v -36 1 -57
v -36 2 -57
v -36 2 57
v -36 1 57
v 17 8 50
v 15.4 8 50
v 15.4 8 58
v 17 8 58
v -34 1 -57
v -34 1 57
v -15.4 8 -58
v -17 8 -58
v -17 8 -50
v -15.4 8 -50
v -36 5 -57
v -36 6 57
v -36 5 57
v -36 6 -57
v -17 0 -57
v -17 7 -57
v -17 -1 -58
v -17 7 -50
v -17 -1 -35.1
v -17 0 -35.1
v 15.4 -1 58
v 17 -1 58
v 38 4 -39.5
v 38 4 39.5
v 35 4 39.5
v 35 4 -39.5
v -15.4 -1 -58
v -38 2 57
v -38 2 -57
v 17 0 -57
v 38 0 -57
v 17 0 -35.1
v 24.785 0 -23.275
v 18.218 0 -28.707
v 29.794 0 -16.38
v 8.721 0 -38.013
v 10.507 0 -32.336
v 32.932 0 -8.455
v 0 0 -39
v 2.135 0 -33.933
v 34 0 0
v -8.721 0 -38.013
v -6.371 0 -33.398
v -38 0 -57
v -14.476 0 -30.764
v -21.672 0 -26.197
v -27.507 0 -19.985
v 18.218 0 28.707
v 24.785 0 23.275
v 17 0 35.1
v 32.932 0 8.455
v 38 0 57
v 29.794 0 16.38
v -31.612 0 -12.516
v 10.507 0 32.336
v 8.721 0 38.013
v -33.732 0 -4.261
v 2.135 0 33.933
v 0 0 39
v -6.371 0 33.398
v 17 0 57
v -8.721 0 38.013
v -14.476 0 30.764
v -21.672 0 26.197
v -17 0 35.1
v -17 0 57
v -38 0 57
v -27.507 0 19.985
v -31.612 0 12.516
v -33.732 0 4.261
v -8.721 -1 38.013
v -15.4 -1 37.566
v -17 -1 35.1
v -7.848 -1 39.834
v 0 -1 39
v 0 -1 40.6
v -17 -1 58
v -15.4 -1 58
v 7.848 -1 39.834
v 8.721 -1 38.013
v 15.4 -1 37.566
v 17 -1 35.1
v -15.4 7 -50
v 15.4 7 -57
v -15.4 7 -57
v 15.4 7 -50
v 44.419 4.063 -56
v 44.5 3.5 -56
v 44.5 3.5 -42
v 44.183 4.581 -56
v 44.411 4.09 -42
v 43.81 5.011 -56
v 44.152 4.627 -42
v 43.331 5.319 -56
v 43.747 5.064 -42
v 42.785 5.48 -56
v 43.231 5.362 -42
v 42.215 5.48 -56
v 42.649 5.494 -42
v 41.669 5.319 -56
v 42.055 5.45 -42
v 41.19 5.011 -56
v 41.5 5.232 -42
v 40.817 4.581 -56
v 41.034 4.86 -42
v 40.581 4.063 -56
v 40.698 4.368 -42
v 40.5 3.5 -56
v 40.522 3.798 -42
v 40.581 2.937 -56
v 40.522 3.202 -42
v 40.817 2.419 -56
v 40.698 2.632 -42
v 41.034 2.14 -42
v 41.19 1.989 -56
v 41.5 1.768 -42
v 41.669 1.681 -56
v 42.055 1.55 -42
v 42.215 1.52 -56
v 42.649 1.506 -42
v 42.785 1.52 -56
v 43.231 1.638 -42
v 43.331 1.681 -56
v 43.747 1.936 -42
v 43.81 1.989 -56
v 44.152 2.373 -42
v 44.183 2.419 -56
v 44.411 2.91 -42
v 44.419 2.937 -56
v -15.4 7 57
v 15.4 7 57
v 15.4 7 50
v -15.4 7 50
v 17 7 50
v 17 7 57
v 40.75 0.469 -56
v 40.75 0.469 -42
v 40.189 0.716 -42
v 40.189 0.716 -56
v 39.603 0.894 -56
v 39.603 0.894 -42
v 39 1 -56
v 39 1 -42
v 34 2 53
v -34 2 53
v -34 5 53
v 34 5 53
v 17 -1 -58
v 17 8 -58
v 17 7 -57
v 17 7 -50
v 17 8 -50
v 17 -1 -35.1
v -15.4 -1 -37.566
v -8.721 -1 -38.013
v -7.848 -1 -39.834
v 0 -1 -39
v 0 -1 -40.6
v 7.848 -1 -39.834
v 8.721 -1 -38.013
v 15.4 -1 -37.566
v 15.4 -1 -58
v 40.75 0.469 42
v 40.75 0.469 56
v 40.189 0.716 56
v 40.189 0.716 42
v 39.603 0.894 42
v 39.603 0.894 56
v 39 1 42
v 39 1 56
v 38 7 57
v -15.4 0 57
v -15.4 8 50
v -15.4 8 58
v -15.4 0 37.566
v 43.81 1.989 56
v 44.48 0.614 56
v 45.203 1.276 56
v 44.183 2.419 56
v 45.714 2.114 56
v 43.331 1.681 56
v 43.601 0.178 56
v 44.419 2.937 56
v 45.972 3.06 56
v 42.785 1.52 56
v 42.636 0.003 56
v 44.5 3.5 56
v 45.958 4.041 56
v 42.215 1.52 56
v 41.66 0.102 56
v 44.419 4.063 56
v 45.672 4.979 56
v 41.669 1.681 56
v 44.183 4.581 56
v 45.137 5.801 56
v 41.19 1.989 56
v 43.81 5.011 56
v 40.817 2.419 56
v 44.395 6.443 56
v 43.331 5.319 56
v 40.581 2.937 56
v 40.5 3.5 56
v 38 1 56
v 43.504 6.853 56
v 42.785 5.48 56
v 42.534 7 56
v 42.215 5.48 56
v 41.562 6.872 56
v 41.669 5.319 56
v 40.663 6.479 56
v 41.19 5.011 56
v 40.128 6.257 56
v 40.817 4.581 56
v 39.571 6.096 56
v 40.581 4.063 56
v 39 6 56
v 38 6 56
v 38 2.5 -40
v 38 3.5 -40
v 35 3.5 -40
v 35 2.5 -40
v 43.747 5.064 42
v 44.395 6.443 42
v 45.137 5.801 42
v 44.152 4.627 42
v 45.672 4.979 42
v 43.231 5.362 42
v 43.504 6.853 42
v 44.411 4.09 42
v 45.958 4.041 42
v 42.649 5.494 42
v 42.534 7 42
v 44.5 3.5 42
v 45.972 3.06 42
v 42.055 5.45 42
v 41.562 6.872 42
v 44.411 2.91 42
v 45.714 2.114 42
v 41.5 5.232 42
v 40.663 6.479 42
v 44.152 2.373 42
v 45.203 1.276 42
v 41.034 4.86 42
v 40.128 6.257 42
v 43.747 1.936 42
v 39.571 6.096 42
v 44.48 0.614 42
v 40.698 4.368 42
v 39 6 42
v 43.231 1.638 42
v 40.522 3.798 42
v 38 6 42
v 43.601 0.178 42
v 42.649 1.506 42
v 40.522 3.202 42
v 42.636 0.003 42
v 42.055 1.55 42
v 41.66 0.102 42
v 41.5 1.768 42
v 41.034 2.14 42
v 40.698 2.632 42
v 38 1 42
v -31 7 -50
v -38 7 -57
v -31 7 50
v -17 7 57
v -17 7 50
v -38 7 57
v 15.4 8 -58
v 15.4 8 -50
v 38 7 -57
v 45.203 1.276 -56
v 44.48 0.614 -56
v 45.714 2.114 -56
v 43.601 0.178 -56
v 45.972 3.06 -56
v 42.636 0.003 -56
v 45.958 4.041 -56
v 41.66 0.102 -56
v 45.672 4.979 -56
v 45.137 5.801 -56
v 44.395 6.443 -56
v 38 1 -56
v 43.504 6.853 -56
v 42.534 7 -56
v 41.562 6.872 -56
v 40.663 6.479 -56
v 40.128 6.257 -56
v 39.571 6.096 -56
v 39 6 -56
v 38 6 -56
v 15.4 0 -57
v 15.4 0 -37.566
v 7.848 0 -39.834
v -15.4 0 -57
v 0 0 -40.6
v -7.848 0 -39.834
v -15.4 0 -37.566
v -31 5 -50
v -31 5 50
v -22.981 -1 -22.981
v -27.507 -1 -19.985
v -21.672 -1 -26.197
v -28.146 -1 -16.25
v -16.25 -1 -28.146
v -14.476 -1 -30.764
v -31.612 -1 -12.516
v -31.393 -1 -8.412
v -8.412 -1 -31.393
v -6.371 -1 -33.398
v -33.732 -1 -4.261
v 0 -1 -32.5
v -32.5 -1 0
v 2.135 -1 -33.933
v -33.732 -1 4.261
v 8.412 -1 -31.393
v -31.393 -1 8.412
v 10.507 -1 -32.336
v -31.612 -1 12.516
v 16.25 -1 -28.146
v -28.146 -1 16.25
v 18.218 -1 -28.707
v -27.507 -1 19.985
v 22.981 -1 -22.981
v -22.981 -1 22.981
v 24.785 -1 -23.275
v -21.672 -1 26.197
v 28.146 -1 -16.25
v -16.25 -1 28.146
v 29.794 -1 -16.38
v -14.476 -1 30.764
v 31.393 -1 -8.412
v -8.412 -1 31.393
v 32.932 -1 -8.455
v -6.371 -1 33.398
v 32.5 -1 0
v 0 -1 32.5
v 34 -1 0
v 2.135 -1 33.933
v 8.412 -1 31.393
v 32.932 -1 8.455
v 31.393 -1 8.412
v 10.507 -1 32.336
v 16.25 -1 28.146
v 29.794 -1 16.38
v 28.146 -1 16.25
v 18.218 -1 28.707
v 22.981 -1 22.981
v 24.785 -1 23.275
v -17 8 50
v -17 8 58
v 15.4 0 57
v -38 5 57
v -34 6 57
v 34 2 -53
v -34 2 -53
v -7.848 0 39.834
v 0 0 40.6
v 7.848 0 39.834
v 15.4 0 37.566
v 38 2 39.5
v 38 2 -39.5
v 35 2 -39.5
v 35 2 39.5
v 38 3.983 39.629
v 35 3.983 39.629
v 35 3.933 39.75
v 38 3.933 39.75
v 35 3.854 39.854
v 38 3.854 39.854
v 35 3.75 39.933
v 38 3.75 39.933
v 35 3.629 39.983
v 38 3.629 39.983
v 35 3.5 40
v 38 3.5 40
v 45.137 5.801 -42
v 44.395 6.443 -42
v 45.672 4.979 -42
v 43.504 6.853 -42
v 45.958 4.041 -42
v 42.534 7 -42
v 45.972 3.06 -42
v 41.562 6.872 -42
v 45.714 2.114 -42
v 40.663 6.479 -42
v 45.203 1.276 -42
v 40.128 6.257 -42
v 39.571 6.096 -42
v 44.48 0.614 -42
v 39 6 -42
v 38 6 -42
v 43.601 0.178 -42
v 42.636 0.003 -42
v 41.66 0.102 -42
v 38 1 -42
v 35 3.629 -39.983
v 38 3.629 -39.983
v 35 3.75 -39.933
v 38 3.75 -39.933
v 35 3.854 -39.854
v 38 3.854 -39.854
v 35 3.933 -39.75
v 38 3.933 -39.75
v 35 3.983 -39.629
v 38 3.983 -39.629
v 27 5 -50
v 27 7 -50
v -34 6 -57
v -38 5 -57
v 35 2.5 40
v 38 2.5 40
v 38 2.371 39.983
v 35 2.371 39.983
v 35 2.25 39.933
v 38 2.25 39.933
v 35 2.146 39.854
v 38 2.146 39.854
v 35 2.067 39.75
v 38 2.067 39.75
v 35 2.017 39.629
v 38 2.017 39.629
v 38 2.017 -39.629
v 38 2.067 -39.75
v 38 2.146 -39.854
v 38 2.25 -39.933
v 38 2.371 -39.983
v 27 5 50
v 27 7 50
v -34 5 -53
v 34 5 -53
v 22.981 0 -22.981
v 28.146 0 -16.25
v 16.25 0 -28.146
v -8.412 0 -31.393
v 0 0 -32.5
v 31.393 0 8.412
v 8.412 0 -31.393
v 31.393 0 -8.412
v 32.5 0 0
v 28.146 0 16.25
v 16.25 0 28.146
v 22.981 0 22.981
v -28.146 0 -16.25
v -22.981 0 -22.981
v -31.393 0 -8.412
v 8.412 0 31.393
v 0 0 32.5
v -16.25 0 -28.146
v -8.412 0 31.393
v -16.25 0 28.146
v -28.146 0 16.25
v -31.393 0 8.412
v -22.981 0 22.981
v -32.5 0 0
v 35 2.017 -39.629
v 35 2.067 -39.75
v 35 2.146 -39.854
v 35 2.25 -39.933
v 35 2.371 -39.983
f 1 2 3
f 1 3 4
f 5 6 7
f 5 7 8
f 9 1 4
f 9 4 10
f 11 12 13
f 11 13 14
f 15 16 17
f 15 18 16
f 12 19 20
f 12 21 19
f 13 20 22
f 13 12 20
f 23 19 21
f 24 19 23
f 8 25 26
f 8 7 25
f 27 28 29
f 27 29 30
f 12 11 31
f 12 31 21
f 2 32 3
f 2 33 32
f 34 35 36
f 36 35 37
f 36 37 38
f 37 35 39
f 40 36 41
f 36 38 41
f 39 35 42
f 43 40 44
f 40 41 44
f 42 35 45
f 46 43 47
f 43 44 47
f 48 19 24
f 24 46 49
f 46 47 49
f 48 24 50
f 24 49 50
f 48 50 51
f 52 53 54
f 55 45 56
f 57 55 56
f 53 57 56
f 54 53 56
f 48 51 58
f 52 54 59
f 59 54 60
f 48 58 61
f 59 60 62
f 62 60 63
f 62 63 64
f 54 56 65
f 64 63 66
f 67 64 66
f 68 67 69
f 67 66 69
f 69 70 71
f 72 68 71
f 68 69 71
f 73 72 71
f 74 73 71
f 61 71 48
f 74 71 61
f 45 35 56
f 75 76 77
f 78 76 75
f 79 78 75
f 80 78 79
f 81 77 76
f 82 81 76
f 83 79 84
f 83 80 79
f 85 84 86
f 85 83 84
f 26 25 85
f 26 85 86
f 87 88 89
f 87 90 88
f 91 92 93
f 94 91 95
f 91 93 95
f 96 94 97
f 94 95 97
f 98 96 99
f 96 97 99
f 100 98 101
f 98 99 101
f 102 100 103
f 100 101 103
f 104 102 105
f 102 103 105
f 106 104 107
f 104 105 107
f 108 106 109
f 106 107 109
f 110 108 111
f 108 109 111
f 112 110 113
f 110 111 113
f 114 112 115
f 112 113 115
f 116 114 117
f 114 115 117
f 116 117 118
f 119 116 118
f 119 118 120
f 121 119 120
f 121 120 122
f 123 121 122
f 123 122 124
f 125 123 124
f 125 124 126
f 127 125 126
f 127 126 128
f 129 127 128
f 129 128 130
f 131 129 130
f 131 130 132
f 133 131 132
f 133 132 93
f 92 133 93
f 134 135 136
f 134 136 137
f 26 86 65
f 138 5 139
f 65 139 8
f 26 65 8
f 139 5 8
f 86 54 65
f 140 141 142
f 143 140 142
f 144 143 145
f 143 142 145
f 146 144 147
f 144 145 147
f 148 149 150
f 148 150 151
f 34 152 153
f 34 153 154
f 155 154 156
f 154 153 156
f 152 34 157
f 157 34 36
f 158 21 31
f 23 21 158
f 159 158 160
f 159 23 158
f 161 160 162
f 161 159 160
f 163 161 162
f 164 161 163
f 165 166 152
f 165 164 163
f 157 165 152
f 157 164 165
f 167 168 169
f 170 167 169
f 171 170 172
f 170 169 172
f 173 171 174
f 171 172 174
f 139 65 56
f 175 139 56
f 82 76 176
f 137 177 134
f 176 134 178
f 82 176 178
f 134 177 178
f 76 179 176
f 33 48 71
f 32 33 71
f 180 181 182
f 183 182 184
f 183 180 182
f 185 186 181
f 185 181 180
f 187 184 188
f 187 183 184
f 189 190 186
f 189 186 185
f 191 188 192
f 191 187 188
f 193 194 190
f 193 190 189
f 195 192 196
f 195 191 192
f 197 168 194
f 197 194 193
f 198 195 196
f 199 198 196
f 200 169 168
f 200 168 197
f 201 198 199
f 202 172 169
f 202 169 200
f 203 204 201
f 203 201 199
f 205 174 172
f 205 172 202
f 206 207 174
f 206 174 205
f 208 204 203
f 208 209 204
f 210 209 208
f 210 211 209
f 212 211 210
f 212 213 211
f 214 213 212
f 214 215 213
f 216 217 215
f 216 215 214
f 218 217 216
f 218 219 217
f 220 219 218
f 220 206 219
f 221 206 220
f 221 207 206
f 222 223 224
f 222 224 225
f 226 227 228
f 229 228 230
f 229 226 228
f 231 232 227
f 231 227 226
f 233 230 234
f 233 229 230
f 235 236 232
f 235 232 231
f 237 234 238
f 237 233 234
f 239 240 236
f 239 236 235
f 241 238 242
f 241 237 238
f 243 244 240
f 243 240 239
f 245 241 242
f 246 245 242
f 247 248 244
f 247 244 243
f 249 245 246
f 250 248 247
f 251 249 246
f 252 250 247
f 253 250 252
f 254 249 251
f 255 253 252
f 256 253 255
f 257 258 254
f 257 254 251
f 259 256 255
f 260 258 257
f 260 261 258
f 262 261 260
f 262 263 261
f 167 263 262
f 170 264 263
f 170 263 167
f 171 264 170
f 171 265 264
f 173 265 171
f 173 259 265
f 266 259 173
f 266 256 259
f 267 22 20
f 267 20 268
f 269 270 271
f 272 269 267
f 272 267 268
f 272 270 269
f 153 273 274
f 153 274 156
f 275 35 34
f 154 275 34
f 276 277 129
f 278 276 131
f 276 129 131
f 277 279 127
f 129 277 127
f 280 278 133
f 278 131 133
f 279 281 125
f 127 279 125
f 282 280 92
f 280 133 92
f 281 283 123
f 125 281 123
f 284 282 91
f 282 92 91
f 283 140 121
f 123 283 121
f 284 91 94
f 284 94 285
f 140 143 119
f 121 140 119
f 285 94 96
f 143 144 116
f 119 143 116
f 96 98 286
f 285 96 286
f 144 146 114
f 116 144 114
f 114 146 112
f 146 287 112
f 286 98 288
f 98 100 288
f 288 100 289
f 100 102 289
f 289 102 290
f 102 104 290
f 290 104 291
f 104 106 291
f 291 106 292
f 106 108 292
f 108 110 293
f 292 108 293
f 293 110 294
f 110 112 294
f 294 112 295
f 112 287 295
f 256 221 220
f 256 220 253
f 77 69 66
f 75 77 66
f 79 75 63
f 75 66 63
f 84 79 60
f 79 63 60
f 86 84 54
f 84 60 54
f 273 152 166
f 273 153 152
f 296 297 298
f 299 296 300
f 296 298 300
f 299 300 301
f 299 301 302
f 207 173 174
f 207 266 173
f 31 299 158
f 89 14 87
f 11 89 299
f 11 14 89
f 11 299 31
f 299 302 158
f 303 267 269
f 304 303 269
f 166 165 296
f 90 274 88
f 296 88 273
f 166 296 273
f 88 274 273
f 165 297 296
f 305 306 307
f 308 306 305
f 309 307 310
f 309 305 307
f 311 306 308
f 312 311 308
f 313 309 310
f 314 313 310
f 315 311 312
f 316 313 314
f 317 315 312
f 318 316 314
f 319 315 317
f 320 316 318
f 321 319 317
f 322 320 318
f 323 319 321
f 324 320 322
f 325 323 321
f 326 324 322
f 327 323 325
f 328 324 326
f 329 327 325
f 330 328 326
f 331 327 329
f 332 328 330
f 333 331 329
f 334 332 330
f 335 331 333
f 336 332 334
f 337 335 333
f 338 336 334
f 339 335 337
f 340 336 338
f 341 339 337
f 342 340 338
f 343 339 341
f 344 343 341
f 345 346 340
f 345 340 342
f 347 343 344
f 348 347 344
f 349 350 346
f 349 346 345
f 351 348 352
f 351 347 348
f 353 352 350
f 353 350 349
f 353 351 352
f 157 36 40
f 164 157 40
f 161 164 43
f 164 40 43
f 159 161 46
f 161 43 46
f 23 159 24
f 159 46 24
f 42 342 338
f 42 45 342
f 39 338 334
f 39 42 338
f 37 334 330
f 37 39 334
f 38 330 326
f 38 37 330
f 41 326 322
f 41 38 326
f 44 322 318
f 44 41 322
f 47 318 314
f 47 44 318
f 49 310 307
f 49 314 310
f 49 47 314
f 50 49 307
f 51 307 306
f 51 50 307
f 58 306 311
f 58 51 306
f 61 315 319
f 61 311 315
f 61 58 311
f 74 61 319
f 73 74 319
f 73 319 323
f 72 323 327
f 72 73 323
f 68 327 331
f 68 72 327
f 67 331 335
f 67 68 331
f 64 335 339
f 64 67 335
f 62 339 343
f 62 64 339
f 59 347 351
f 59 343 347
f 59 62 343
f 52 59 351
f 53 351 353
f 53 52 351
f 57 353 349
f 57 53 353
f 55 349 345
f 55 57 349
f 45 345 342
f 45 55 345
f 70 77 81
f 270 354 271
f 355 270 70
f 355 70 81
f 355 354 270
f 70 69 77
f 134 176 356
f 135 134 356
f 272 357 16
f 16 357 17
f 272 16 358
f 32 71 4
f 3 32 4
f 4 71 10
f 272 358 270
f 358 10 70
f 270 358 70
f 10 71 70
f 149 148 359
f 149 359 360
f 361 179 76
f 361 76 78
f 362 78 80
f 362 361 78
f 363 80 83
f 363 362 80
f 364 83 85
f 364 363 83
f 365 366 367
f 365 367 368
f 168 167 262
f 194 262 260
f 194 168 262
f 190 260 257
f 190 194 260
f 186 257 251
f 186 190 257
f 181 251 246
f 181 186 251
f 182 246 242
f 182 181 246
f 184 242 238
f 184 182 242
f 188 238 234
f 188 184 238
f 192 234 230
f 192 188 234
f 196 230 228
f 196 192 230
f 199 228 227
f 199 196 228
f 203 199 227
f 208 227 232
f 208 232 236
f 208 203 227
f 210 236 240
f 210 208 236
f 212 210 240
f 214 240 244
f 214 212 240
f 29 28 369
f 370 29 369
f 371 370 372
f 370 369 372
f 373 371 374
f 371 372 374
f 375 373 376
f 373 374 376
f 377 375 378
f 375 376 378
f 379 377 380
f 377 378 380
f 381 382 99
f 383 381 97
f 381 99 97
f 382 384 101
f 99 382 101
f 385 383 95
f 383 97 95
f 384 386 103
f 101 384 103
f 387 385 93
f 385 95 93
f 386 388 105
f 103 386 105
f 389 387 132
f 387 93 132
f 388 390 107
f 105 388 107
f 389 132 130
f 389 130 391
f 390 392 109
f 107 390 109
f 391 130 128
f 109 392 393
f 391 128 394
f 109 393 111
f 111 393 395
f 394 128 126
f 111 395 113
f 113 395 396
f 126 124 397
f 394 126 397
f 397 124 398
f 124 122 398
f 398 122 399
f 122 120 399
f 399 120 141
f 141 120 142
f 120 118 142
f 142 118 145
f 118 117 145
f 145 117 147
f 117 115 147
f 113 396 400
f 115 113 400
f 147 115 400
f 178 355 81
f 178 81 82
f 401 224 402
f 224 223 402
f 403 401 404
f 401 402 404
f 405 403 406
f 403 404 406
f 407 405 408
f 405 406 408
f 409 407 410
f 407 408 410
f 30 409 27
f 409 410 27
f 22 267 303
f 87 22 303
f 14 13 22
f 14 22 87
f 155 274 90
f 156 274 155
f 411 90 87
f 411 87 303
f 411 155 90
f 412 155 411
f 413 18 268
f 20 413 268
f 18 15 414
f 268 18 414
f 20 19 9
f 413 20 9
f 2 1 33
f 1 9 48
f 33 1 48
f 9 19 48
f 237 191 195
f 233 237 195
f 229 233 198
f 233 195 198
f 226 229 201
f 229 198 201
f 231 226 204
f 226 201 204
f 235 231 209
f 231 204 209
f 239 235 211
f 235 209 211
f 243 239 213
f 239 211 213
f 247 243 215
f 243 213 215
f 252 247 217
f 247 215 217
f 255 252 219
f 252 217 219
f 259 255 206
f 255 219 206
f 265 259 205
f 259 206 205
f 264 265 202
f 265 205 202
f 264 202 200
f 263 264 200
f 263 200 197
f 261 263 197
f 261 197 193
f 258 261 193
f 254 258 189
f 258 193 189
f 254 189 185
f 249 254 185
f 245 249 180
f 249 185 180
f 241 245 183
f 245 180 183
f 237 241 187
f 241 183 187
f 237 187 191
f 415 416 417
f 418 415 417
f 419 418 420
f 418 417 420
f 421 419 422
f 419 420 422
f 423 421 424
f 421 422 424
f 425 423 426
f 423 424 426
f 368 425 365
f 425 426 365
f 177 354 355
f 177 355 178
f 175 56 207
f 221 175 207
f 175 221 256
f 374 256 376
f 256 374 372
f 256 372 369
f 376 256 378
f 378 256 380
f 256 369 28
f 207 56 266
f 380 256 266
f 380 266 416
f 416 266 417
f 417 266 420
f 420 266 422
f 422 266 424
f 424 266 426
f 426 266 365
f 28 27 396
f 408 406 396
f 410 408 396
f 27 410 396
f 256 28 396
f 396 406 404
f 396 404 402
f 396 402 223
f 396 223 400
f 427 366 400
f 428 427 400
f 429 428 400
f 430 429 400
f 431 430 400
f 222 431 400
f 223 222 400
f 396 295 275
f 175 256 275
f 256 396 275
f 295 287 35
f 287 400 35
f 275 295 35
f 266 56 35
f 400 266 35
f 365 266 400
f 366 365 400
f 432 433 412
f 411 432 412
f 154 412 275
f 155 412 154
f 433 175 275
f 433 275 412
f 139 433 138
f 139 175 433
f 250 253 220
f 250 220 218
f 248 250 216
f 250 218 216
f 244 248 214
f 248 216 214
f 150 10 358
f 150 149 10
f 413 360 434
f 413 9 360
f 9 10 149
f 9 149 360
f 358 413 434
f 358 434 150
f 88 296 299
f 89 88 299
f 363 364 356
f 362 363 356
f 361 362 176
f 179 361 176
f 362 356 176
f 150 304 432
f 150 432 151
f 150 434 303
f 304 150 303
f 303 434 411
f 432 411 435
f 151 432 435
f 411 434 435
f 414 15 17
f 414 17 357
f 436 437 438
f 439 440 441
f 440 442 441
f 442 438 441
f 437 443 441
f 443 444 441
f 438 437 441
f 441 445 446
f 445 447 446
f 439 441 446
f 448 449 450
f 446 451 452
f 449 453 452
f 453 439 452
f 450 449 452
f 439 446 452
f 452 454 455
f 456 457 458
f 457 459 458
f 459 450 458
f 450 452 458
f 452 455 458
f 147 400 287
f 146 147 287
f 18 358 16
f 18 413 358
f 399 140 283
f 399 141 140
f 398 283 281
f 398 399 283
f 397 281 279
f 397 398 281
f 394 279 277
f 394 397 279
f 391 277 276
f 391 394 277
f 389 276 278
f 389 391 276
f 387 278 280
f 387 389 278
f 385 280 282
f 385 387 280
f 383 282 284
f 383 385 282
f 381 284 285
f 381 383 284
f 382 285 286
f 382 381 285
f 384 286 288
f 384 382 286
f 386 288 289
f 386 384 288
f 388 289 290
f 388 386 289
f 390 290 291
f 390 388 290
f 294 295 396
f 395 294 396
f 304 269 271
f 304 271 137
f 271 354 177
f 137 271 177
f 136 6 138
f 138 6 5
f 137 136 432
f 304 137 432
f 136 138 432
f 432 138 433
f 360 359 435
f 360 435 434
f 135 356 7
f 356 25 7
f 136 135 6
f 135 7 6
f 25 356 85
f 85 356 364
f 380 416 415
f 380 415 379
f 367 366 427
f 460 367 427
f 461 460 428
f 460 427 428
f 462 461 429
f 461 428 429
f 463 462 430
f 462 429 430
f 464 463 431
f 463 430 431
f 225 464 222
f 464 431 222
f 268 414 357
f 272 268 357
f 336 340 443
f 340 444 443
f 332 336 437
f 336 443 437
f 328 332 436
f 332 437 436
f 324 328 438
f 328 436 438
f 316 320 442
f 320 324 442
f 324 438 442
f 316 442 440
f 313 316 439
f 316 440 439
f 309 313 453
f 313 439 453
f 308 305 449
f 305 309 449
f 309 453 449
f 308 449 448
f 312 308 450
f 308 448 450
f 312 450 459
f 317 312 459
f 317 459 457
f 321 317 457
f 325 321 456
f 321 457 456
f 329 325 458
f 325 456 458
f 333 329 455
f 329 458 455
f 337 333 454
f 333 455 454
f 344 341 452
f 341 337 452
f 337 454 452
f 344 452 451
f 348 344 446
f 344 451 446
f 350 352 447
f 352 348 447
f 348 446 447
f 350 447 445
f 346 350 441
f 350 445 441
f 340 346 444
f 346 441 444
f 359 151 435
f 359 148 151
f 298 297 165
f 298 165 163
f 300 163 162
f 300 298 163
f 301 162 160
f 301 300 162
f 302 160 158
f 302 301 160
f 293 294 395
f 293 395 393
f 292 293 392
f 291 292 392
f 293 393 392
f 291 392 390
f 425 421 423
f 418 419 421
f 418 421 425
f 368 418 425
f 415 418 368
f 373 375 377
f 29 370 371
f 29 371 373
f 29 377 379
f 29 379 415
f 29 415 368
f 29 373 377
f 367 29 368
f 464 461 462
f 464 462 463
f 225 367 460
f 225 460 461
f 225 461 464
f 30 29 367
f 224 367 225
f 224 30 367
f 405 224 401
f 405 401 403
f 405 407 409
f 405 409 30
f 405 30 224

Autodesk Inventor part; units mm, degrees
ref_plane "YZ Plane" through (0, 0, 0) normal (1, 0, 0) x (0, 1, 0)
ref_plane "XZ Plane" through (0, 0, 0) normal (0, 1, 0) x (-1, 0, 0)
ref_plane "XY Plane" through (0, 0, 0) normal (0, 0, 1) x (1, 0, 0)
sketch "Эскиз1" plane through (0, 0, 0) normal (0, 1, 0) x (-1, 0, 0)
  line L0 (34, 53) -> (-34, 53)
  line L1 (-34, 53) -> (-34, -53)
  line L2 (-34, -53) -> (34, -53)
  line L3 (34, -53) -> (34, 53)
  line L4 (34, 53) -> (-34, -53) construction
  line L5 (-34, 53) -> (34, -53) construction
  line L6 (38, 57) -> (-38, 57)
  line L7 (-38, 57) -> (-38, -57)
  line L8 (-38, -57) -> (38, -57)
  line L9 (38, -57) -> (38, 57)
  point P0 (0, 0)
  dimension "d1" = 68
  dimension "d2" = 106
  dimension "d3" = 4
extrude "Выдавливание1" add sketch "Эскиз1" along normal blind 2 contours L3 L2 L1 L0
extrude "Выдавливание2" add sketch "Эскиз1" along normal blind 7
sketch "Эскиз2" plane through (0, 7, 0) normal (0, 1, 0) x (1, 0, 0)
  line L0 (34, -53) -> (-34, -53) projected
  line L1 (34, 53) -> (-34, 53)
  line L2 (-34, 53) -> (-34, -53)
  line L3 (-34, -53) -> (34, -53)
  line L4 (34, -53) -> (34, 53)
  line L5 (34, 53) -> (-34, -53) construction
  line L6 (-34, 53) -> (34, -53) construction
  line L7 (-34, -53) -> (-34, -50)
  line L8 (-34, -50) -> (34, -50)
  line L9 (-34, 53) -> (34, 53) projected
  line L10 (-34, 53) -> (-34, 50)
  line L11 (-34, 50) -> (34, 50)
  line L12 (34, 53) -> (34, -53) projected
  line L13 (34, -50) -> (27, -50)
  line L14 (27, -50) -> (27, 50)
  line L15 (-34, 50) -> (-31, 50)
  line L16 (-31, 50) -> (-31, -50)
  point P0 (0, 0)
  dimension "d8" = 3
  dimension "d9" = 3
  dimension "d10" = 7
  dimension "d11" = 3
extrude "Выдавливание3" add sketch "Эскиз2" against normal blind 2 contours L0 L2 L8 L4 | L8 L14 L11 L4 | L2 L11 L16 L8 | L11 L2 L1 L4
sketch "Эскиз3" plane through (38, 0, 57) normal (1, 0, 0) x (0, 0, -1)
  line L0 (114, 0) -> (0, 0) projected
  line L1 (0, 0) -> (16, 0)
  line L2 (16, 0) -> (16, 7)
  line L3 (114, 7) -> (0, 7) projected
  line L4 (114, 0) -> (114, 7) projected
  line L5 (114, 0) -> (98, 0)
  line L6 (98, 0) -> (98, 7)
  line L7 (98, 7) -> (114, 7)
  line L8 (114, 7) -> (114, 0)
  line L9 (0, 0) -> (0, 7)
  line L10 (0, 7) -> (16, 7)
  line L11 (15, 6) -> (15, 1)
  line L12 (15, 1) -> (1, 1)
  line L13 (1, 1) -> (1, 6)
  line L14 (1, 6) -> (15, 6)
  line L15 (99, 6) -> (99, 1)
  line L16 (99, 1) -> (113, 1)
  line L17 (113, 1) -> (113, 6)
  line L18 (113, 6) -> (99, 6)
  line L19 (16, 0) -> (17, 0)
  line L20 (17, 0) -> (17, 2)
  line L21 (98, 0) -> (97, 0)
  line L22 (97, 0) -> (97, 2)
  line L23 (96.5, 2) -> (17.5, 2)
  line L24 (17, 2.5) -> (17, 3.5)
  line L25 (17.5, 4) -> (96.5, 4)
  line L26 (97, 3.5) -> (97, 2.5)
  line L27 (110, 2) -> (4, 2) projected
  arc A0 (17.5, 4) -> (17, 3.5) centre (17.5, 3.5) ccw
  arc A1 (17, 2.5) -> (17.5, 2) centre (17.5, 2.5) ccw
  arc A2 (97, 3.5) -> (96.5, 4) centre (96.5, 3.5) ccw
  arc A3 (96.5, 2) -> (97, 2.5) centre (96.5, 2.5) ccw
  point P0 (57, 0)
  point P1 (17, 4)
  dimension "d14" = 16
  dimension "d15" = 16
  dimension "d16" = 1
  dimension "d17" = 1
  dimension "d18" = 1
  dimension "d19" = 2
  dimension "d20" = 1
  dimension "d21" = 2
  dimension "d22" = 2
  dimension "d23" = 0.5
extrude "Выдавливание4" cut sketch "Эскиз3" against normal blind 3 contours L23 A1 L24 A0 L25 A2 L26 A3
extrude "Выдавливание5" add sketch "Эскиз3" along normal blind 1 contours L15 L18 L17 L16 | L11 L12 L13 L14
sketch "Эскиз4" plane through (38, 0, -57) normal (0, 0, -1) x (-1, 0, 0)
  line L0 (0, 0) -> (76, 0) projected
  line L1 (76, 0) -> (76, 2)
  line L2 (76, 0) -> (76, 7) projected
  line L3 (72, 2) -> (72, 5) projected
  line L4 (76, 2) -> (72, 2)
  line L5 (72, 2) -> (72, 5)
  line L6 (72, 5) -> (76, 5)
  line L7 (76, 5) -> (76, 2)
  line L8 (72, 5) -> (72, 6)
  line L9 (72, 6) -> (74, 6)
  line L10 (74, 6) -> (74, 5)
  line L11 (74, 2) -> (74, 1)
  line L12 (74, 1) -> (72, 1)
  line L13 (72, 1) -> (72, 2)
  point P0 (38, 0)
  dimension "d28" = 2
  dimension "d29" = 1
  dimension "d30" = 2
  dimension "d31" = 1
extrude "Выдавливание6" cut sketch "Эскиз4" against normal blind 120
sketch "Эскиз5" plane through (38, 1, 56) normal (0, 0, 1) x (1, 0, 0)
  line L0 (1, 5) -> (1, 0) projected
  line L1 (1, 0) -> (1, 2.5)
  line L2 (1, 2.5) -> (4.5, 2.5)
  circle A0 centre (4.5, 2.5) radius 3.5
  arc A1 (2.75, -0.5311) -> (1, 0) centre (0.4167, -5.0709) ccw
  arc A2 (1, 5) -> (2.6628, 5.479) centre (0.4389, 10.0731) ccw
  circle A3 centre (4.5, 2.5) radius 2
  point P0 (-38, -1)
  dimension "d34" = 2.5
  dimension "d36" = 3.5
  dimension "d37" = 5.104
  dimension "d38" = 4
extrude "Выдавливание7" add sketch "Эскиз5" against normal blind 112
sketch "Эскиз6" plane through (38, 1, 42) normal (0, 0, -1) x (-1, 0, 0)
  line L0 (0, 5) -> (-1, 5) projected
  line L1 (-1, 5) -> (-1, 8.1758)
  line L2 (-1, 8.1758) -> (-10.78, 8.3268)
  line L3 (-10.78, 8.3268) -> (-10.1005, -3.8271)
  line L4 (-10.1005, -3.8271) -> (-1.8469, -2.418)
  line L5 (-1.8469, -2.418) -> (-1, -0.011)
  line L6 (-1, -0.011) -> (-1, 5)
  point P0 (38, -1)
extrude "Выдавливание8" cut sketch "Эскиз6" along normal blind 84
sketch "Эскиз7" plane through (0, 0, 0) normal (0, -1, 0) x (1, 0, 0)
  circle A0 centre (0, 0) radius 34
  circle A1 centre (0, 0) radius 32.5
  line L0 (-17, -57.0311) -> (17, -57.0311)
  line L1 (-17, -57.0311) -> (-17, -35.0999)
  line L2 (-38, 57) -> (38, 57) projected
  line L3 (17, 57) -> (-17, 57)
  arc A2 (17, 35.0999) -> (-17, 35.0999) centre (0, 0) ccw
  arc A3 (-17, -35.0999) -> (17, -35.0999) centre (0, 0) ccw
  line L4 (-17, 35.0999) -> (-17, 57)
  line L5 (17, 35.0999) -> (17, 57)
  line L6 (17, -57.0311) -> (17, -35.0999)
  line L7 (-15.4, -37.5659) -> (-15.4, -55.4311)
  line L8 (15.4, -55.4311) -> (15.4, -37.5659)
  arc A4 (-15.4, -37.5659) -> (15.4, -37.5659) centre (0, 0) ccw
  line L9 (15.4, 55.4) -> (15.4, 37.5659)
  arc A5 (15.4, 37.5659) -> (-15.4, 37.5659) centre (0, 0) ccw
  line L10 (-15.4, 37.5659) -> (-15.4, 55.4)
  line L11 (-15.4, -55.4311) -> (-15.4, -57.0311)
  line L12 (15.4, -55.4311) -> (15.4, -57.0311)
  line L13 (-15.4, 55.4) -> (-15.4, 57)
  line L14 (15.4, 55.4) -> (15.4, 57)
  dimension "d43" = 65
  dimension "d51" = 1.6
  dimension "d52" = 1.6
extrude "Выдавливание9" add sketch "Эскиз7" along normal blind 1 contours A0 | L1 A3 L6 L0 L12 L8 A4 L7 L11 | L2 L13 L10 A5 L9 L14 L5 A2 L4
sketch "Эскиз8" plane through (-38, 7, 57) normal (0, 0, 1) x (1, 0, 0)
  line L0 (21, -7) -> (21, -8) projected
  line L1 (21, -8) -> (21, 0)
  line L2 (76, 0) -> (0, 0) projected
  line L3 (55, -8) -> (21, -8) projected
  line L4 (21, -8) -> (22.6, -8)
  line L5 (22.6, -8) -> (22.6, 0)
  line L6 (22.6, 0) -> (21, 0)
  line L7 (53.4, -7) -> (53.4, -8) projected
  line L8 (53.4, -8) -> (53.4, 0)
  line L9 (53.4, 0) -> (55, 0)
  line L10 (55, 0) -> (55, -8)
  line L11 (55, -8) -> (53.4, -8)
  point P0 (38, -7)
  dimension "d55" = 1.6
  dimension "d56" = 1.6
extrude "Выдавливание10" add sketch "Эскиз8" along normal blind 1 contours L1 L2 L5 L3 L0 | L7 L8 L2 L10 L3
sketch "Эскиз9" plane through (38, 7, -57) normal (0, 0, -1) x (-1, 0, 0)
  line L0 (55, -7) -> (55, -8) projected
  line L1 (55, -8) -> (55, 0)
  line L2 (55, 0) -> (53.4, 0)
  line L3 (53.4, -7) -> (53.4, -8) projected
  line L4 (53.4, 0) -> (53.4, -8)
  line L5 (53.4, -8) -> (55, -8)
  line L6 (22.6, -7) -> (22.6, -8) projected
  line L7 (22.6, -8) -> (22.6, 0)
  line L8 (22.6, 0) -> (21, 0)
  line L9 (21, 0) -> (21, -8)
  line L10 (21, -8) -> (22.6, -8)
  point P0 (38, -7)
  dimension "d59" = 8
  dimension "d60" = 1.6
  dimension "d61" = 1.6
extrude "Выдавливание11" add sketch "Эскиз9" along normal blind 1
sketch "Эскиз10" plane through (0, 7, 0) normal (0, 1, 0) x (1, 0, 0)
  line L0 (-15.4, -58) -> (-17, -58) projected
  line L1 (-17, -58) -> (-17, -50)
  line L2 (27, -50) -> (-31, -50) projected
  line L3 (-15.4, -57) -> (-15.4, -58) projected
  line L4 (-15.4, -58) -> (-17, -58)
  line L5 (-15.4, -58) -> (-15.4, -50)
  line L6 (-15.4, -50) -> (-17, -50)
  line L7 (15.4, -58) -> (15.4, -50)
  line L8 (15.4, -50) -> (17, -50)
  line L9 (17, -35.0999) -> (17, -58) projected
  line L10 (17, -58) -> (15.4, -58)
  line L11 (17, -58) -> (17, -50)
  line L12 (-17, 58) -> (-15.4, 58) projected
  line L13 (-17, 58) -> (-17, 50)
  line L14 (-17, 50) -> (-15.4, 50)
  line L15 (-15.4, 50) -> (-15.4, 58)
  line L16 (-15.4, 58) -> (-17, 58)
  line L17 (15.4, 58) -> (15.4, 50)
  line L18 (15.4, 50) -> (17, 50)
  line L19 (17, 58) -> (17, 50)
  line L20 (15.4, 58) -> (17, 58)
  point P0 (0, 0)
  dimension "d64" = 8
extrude "Выдавливание12" add sketch "Эскиз10" along normal blind 1
properties part number "Дета2ль1"
